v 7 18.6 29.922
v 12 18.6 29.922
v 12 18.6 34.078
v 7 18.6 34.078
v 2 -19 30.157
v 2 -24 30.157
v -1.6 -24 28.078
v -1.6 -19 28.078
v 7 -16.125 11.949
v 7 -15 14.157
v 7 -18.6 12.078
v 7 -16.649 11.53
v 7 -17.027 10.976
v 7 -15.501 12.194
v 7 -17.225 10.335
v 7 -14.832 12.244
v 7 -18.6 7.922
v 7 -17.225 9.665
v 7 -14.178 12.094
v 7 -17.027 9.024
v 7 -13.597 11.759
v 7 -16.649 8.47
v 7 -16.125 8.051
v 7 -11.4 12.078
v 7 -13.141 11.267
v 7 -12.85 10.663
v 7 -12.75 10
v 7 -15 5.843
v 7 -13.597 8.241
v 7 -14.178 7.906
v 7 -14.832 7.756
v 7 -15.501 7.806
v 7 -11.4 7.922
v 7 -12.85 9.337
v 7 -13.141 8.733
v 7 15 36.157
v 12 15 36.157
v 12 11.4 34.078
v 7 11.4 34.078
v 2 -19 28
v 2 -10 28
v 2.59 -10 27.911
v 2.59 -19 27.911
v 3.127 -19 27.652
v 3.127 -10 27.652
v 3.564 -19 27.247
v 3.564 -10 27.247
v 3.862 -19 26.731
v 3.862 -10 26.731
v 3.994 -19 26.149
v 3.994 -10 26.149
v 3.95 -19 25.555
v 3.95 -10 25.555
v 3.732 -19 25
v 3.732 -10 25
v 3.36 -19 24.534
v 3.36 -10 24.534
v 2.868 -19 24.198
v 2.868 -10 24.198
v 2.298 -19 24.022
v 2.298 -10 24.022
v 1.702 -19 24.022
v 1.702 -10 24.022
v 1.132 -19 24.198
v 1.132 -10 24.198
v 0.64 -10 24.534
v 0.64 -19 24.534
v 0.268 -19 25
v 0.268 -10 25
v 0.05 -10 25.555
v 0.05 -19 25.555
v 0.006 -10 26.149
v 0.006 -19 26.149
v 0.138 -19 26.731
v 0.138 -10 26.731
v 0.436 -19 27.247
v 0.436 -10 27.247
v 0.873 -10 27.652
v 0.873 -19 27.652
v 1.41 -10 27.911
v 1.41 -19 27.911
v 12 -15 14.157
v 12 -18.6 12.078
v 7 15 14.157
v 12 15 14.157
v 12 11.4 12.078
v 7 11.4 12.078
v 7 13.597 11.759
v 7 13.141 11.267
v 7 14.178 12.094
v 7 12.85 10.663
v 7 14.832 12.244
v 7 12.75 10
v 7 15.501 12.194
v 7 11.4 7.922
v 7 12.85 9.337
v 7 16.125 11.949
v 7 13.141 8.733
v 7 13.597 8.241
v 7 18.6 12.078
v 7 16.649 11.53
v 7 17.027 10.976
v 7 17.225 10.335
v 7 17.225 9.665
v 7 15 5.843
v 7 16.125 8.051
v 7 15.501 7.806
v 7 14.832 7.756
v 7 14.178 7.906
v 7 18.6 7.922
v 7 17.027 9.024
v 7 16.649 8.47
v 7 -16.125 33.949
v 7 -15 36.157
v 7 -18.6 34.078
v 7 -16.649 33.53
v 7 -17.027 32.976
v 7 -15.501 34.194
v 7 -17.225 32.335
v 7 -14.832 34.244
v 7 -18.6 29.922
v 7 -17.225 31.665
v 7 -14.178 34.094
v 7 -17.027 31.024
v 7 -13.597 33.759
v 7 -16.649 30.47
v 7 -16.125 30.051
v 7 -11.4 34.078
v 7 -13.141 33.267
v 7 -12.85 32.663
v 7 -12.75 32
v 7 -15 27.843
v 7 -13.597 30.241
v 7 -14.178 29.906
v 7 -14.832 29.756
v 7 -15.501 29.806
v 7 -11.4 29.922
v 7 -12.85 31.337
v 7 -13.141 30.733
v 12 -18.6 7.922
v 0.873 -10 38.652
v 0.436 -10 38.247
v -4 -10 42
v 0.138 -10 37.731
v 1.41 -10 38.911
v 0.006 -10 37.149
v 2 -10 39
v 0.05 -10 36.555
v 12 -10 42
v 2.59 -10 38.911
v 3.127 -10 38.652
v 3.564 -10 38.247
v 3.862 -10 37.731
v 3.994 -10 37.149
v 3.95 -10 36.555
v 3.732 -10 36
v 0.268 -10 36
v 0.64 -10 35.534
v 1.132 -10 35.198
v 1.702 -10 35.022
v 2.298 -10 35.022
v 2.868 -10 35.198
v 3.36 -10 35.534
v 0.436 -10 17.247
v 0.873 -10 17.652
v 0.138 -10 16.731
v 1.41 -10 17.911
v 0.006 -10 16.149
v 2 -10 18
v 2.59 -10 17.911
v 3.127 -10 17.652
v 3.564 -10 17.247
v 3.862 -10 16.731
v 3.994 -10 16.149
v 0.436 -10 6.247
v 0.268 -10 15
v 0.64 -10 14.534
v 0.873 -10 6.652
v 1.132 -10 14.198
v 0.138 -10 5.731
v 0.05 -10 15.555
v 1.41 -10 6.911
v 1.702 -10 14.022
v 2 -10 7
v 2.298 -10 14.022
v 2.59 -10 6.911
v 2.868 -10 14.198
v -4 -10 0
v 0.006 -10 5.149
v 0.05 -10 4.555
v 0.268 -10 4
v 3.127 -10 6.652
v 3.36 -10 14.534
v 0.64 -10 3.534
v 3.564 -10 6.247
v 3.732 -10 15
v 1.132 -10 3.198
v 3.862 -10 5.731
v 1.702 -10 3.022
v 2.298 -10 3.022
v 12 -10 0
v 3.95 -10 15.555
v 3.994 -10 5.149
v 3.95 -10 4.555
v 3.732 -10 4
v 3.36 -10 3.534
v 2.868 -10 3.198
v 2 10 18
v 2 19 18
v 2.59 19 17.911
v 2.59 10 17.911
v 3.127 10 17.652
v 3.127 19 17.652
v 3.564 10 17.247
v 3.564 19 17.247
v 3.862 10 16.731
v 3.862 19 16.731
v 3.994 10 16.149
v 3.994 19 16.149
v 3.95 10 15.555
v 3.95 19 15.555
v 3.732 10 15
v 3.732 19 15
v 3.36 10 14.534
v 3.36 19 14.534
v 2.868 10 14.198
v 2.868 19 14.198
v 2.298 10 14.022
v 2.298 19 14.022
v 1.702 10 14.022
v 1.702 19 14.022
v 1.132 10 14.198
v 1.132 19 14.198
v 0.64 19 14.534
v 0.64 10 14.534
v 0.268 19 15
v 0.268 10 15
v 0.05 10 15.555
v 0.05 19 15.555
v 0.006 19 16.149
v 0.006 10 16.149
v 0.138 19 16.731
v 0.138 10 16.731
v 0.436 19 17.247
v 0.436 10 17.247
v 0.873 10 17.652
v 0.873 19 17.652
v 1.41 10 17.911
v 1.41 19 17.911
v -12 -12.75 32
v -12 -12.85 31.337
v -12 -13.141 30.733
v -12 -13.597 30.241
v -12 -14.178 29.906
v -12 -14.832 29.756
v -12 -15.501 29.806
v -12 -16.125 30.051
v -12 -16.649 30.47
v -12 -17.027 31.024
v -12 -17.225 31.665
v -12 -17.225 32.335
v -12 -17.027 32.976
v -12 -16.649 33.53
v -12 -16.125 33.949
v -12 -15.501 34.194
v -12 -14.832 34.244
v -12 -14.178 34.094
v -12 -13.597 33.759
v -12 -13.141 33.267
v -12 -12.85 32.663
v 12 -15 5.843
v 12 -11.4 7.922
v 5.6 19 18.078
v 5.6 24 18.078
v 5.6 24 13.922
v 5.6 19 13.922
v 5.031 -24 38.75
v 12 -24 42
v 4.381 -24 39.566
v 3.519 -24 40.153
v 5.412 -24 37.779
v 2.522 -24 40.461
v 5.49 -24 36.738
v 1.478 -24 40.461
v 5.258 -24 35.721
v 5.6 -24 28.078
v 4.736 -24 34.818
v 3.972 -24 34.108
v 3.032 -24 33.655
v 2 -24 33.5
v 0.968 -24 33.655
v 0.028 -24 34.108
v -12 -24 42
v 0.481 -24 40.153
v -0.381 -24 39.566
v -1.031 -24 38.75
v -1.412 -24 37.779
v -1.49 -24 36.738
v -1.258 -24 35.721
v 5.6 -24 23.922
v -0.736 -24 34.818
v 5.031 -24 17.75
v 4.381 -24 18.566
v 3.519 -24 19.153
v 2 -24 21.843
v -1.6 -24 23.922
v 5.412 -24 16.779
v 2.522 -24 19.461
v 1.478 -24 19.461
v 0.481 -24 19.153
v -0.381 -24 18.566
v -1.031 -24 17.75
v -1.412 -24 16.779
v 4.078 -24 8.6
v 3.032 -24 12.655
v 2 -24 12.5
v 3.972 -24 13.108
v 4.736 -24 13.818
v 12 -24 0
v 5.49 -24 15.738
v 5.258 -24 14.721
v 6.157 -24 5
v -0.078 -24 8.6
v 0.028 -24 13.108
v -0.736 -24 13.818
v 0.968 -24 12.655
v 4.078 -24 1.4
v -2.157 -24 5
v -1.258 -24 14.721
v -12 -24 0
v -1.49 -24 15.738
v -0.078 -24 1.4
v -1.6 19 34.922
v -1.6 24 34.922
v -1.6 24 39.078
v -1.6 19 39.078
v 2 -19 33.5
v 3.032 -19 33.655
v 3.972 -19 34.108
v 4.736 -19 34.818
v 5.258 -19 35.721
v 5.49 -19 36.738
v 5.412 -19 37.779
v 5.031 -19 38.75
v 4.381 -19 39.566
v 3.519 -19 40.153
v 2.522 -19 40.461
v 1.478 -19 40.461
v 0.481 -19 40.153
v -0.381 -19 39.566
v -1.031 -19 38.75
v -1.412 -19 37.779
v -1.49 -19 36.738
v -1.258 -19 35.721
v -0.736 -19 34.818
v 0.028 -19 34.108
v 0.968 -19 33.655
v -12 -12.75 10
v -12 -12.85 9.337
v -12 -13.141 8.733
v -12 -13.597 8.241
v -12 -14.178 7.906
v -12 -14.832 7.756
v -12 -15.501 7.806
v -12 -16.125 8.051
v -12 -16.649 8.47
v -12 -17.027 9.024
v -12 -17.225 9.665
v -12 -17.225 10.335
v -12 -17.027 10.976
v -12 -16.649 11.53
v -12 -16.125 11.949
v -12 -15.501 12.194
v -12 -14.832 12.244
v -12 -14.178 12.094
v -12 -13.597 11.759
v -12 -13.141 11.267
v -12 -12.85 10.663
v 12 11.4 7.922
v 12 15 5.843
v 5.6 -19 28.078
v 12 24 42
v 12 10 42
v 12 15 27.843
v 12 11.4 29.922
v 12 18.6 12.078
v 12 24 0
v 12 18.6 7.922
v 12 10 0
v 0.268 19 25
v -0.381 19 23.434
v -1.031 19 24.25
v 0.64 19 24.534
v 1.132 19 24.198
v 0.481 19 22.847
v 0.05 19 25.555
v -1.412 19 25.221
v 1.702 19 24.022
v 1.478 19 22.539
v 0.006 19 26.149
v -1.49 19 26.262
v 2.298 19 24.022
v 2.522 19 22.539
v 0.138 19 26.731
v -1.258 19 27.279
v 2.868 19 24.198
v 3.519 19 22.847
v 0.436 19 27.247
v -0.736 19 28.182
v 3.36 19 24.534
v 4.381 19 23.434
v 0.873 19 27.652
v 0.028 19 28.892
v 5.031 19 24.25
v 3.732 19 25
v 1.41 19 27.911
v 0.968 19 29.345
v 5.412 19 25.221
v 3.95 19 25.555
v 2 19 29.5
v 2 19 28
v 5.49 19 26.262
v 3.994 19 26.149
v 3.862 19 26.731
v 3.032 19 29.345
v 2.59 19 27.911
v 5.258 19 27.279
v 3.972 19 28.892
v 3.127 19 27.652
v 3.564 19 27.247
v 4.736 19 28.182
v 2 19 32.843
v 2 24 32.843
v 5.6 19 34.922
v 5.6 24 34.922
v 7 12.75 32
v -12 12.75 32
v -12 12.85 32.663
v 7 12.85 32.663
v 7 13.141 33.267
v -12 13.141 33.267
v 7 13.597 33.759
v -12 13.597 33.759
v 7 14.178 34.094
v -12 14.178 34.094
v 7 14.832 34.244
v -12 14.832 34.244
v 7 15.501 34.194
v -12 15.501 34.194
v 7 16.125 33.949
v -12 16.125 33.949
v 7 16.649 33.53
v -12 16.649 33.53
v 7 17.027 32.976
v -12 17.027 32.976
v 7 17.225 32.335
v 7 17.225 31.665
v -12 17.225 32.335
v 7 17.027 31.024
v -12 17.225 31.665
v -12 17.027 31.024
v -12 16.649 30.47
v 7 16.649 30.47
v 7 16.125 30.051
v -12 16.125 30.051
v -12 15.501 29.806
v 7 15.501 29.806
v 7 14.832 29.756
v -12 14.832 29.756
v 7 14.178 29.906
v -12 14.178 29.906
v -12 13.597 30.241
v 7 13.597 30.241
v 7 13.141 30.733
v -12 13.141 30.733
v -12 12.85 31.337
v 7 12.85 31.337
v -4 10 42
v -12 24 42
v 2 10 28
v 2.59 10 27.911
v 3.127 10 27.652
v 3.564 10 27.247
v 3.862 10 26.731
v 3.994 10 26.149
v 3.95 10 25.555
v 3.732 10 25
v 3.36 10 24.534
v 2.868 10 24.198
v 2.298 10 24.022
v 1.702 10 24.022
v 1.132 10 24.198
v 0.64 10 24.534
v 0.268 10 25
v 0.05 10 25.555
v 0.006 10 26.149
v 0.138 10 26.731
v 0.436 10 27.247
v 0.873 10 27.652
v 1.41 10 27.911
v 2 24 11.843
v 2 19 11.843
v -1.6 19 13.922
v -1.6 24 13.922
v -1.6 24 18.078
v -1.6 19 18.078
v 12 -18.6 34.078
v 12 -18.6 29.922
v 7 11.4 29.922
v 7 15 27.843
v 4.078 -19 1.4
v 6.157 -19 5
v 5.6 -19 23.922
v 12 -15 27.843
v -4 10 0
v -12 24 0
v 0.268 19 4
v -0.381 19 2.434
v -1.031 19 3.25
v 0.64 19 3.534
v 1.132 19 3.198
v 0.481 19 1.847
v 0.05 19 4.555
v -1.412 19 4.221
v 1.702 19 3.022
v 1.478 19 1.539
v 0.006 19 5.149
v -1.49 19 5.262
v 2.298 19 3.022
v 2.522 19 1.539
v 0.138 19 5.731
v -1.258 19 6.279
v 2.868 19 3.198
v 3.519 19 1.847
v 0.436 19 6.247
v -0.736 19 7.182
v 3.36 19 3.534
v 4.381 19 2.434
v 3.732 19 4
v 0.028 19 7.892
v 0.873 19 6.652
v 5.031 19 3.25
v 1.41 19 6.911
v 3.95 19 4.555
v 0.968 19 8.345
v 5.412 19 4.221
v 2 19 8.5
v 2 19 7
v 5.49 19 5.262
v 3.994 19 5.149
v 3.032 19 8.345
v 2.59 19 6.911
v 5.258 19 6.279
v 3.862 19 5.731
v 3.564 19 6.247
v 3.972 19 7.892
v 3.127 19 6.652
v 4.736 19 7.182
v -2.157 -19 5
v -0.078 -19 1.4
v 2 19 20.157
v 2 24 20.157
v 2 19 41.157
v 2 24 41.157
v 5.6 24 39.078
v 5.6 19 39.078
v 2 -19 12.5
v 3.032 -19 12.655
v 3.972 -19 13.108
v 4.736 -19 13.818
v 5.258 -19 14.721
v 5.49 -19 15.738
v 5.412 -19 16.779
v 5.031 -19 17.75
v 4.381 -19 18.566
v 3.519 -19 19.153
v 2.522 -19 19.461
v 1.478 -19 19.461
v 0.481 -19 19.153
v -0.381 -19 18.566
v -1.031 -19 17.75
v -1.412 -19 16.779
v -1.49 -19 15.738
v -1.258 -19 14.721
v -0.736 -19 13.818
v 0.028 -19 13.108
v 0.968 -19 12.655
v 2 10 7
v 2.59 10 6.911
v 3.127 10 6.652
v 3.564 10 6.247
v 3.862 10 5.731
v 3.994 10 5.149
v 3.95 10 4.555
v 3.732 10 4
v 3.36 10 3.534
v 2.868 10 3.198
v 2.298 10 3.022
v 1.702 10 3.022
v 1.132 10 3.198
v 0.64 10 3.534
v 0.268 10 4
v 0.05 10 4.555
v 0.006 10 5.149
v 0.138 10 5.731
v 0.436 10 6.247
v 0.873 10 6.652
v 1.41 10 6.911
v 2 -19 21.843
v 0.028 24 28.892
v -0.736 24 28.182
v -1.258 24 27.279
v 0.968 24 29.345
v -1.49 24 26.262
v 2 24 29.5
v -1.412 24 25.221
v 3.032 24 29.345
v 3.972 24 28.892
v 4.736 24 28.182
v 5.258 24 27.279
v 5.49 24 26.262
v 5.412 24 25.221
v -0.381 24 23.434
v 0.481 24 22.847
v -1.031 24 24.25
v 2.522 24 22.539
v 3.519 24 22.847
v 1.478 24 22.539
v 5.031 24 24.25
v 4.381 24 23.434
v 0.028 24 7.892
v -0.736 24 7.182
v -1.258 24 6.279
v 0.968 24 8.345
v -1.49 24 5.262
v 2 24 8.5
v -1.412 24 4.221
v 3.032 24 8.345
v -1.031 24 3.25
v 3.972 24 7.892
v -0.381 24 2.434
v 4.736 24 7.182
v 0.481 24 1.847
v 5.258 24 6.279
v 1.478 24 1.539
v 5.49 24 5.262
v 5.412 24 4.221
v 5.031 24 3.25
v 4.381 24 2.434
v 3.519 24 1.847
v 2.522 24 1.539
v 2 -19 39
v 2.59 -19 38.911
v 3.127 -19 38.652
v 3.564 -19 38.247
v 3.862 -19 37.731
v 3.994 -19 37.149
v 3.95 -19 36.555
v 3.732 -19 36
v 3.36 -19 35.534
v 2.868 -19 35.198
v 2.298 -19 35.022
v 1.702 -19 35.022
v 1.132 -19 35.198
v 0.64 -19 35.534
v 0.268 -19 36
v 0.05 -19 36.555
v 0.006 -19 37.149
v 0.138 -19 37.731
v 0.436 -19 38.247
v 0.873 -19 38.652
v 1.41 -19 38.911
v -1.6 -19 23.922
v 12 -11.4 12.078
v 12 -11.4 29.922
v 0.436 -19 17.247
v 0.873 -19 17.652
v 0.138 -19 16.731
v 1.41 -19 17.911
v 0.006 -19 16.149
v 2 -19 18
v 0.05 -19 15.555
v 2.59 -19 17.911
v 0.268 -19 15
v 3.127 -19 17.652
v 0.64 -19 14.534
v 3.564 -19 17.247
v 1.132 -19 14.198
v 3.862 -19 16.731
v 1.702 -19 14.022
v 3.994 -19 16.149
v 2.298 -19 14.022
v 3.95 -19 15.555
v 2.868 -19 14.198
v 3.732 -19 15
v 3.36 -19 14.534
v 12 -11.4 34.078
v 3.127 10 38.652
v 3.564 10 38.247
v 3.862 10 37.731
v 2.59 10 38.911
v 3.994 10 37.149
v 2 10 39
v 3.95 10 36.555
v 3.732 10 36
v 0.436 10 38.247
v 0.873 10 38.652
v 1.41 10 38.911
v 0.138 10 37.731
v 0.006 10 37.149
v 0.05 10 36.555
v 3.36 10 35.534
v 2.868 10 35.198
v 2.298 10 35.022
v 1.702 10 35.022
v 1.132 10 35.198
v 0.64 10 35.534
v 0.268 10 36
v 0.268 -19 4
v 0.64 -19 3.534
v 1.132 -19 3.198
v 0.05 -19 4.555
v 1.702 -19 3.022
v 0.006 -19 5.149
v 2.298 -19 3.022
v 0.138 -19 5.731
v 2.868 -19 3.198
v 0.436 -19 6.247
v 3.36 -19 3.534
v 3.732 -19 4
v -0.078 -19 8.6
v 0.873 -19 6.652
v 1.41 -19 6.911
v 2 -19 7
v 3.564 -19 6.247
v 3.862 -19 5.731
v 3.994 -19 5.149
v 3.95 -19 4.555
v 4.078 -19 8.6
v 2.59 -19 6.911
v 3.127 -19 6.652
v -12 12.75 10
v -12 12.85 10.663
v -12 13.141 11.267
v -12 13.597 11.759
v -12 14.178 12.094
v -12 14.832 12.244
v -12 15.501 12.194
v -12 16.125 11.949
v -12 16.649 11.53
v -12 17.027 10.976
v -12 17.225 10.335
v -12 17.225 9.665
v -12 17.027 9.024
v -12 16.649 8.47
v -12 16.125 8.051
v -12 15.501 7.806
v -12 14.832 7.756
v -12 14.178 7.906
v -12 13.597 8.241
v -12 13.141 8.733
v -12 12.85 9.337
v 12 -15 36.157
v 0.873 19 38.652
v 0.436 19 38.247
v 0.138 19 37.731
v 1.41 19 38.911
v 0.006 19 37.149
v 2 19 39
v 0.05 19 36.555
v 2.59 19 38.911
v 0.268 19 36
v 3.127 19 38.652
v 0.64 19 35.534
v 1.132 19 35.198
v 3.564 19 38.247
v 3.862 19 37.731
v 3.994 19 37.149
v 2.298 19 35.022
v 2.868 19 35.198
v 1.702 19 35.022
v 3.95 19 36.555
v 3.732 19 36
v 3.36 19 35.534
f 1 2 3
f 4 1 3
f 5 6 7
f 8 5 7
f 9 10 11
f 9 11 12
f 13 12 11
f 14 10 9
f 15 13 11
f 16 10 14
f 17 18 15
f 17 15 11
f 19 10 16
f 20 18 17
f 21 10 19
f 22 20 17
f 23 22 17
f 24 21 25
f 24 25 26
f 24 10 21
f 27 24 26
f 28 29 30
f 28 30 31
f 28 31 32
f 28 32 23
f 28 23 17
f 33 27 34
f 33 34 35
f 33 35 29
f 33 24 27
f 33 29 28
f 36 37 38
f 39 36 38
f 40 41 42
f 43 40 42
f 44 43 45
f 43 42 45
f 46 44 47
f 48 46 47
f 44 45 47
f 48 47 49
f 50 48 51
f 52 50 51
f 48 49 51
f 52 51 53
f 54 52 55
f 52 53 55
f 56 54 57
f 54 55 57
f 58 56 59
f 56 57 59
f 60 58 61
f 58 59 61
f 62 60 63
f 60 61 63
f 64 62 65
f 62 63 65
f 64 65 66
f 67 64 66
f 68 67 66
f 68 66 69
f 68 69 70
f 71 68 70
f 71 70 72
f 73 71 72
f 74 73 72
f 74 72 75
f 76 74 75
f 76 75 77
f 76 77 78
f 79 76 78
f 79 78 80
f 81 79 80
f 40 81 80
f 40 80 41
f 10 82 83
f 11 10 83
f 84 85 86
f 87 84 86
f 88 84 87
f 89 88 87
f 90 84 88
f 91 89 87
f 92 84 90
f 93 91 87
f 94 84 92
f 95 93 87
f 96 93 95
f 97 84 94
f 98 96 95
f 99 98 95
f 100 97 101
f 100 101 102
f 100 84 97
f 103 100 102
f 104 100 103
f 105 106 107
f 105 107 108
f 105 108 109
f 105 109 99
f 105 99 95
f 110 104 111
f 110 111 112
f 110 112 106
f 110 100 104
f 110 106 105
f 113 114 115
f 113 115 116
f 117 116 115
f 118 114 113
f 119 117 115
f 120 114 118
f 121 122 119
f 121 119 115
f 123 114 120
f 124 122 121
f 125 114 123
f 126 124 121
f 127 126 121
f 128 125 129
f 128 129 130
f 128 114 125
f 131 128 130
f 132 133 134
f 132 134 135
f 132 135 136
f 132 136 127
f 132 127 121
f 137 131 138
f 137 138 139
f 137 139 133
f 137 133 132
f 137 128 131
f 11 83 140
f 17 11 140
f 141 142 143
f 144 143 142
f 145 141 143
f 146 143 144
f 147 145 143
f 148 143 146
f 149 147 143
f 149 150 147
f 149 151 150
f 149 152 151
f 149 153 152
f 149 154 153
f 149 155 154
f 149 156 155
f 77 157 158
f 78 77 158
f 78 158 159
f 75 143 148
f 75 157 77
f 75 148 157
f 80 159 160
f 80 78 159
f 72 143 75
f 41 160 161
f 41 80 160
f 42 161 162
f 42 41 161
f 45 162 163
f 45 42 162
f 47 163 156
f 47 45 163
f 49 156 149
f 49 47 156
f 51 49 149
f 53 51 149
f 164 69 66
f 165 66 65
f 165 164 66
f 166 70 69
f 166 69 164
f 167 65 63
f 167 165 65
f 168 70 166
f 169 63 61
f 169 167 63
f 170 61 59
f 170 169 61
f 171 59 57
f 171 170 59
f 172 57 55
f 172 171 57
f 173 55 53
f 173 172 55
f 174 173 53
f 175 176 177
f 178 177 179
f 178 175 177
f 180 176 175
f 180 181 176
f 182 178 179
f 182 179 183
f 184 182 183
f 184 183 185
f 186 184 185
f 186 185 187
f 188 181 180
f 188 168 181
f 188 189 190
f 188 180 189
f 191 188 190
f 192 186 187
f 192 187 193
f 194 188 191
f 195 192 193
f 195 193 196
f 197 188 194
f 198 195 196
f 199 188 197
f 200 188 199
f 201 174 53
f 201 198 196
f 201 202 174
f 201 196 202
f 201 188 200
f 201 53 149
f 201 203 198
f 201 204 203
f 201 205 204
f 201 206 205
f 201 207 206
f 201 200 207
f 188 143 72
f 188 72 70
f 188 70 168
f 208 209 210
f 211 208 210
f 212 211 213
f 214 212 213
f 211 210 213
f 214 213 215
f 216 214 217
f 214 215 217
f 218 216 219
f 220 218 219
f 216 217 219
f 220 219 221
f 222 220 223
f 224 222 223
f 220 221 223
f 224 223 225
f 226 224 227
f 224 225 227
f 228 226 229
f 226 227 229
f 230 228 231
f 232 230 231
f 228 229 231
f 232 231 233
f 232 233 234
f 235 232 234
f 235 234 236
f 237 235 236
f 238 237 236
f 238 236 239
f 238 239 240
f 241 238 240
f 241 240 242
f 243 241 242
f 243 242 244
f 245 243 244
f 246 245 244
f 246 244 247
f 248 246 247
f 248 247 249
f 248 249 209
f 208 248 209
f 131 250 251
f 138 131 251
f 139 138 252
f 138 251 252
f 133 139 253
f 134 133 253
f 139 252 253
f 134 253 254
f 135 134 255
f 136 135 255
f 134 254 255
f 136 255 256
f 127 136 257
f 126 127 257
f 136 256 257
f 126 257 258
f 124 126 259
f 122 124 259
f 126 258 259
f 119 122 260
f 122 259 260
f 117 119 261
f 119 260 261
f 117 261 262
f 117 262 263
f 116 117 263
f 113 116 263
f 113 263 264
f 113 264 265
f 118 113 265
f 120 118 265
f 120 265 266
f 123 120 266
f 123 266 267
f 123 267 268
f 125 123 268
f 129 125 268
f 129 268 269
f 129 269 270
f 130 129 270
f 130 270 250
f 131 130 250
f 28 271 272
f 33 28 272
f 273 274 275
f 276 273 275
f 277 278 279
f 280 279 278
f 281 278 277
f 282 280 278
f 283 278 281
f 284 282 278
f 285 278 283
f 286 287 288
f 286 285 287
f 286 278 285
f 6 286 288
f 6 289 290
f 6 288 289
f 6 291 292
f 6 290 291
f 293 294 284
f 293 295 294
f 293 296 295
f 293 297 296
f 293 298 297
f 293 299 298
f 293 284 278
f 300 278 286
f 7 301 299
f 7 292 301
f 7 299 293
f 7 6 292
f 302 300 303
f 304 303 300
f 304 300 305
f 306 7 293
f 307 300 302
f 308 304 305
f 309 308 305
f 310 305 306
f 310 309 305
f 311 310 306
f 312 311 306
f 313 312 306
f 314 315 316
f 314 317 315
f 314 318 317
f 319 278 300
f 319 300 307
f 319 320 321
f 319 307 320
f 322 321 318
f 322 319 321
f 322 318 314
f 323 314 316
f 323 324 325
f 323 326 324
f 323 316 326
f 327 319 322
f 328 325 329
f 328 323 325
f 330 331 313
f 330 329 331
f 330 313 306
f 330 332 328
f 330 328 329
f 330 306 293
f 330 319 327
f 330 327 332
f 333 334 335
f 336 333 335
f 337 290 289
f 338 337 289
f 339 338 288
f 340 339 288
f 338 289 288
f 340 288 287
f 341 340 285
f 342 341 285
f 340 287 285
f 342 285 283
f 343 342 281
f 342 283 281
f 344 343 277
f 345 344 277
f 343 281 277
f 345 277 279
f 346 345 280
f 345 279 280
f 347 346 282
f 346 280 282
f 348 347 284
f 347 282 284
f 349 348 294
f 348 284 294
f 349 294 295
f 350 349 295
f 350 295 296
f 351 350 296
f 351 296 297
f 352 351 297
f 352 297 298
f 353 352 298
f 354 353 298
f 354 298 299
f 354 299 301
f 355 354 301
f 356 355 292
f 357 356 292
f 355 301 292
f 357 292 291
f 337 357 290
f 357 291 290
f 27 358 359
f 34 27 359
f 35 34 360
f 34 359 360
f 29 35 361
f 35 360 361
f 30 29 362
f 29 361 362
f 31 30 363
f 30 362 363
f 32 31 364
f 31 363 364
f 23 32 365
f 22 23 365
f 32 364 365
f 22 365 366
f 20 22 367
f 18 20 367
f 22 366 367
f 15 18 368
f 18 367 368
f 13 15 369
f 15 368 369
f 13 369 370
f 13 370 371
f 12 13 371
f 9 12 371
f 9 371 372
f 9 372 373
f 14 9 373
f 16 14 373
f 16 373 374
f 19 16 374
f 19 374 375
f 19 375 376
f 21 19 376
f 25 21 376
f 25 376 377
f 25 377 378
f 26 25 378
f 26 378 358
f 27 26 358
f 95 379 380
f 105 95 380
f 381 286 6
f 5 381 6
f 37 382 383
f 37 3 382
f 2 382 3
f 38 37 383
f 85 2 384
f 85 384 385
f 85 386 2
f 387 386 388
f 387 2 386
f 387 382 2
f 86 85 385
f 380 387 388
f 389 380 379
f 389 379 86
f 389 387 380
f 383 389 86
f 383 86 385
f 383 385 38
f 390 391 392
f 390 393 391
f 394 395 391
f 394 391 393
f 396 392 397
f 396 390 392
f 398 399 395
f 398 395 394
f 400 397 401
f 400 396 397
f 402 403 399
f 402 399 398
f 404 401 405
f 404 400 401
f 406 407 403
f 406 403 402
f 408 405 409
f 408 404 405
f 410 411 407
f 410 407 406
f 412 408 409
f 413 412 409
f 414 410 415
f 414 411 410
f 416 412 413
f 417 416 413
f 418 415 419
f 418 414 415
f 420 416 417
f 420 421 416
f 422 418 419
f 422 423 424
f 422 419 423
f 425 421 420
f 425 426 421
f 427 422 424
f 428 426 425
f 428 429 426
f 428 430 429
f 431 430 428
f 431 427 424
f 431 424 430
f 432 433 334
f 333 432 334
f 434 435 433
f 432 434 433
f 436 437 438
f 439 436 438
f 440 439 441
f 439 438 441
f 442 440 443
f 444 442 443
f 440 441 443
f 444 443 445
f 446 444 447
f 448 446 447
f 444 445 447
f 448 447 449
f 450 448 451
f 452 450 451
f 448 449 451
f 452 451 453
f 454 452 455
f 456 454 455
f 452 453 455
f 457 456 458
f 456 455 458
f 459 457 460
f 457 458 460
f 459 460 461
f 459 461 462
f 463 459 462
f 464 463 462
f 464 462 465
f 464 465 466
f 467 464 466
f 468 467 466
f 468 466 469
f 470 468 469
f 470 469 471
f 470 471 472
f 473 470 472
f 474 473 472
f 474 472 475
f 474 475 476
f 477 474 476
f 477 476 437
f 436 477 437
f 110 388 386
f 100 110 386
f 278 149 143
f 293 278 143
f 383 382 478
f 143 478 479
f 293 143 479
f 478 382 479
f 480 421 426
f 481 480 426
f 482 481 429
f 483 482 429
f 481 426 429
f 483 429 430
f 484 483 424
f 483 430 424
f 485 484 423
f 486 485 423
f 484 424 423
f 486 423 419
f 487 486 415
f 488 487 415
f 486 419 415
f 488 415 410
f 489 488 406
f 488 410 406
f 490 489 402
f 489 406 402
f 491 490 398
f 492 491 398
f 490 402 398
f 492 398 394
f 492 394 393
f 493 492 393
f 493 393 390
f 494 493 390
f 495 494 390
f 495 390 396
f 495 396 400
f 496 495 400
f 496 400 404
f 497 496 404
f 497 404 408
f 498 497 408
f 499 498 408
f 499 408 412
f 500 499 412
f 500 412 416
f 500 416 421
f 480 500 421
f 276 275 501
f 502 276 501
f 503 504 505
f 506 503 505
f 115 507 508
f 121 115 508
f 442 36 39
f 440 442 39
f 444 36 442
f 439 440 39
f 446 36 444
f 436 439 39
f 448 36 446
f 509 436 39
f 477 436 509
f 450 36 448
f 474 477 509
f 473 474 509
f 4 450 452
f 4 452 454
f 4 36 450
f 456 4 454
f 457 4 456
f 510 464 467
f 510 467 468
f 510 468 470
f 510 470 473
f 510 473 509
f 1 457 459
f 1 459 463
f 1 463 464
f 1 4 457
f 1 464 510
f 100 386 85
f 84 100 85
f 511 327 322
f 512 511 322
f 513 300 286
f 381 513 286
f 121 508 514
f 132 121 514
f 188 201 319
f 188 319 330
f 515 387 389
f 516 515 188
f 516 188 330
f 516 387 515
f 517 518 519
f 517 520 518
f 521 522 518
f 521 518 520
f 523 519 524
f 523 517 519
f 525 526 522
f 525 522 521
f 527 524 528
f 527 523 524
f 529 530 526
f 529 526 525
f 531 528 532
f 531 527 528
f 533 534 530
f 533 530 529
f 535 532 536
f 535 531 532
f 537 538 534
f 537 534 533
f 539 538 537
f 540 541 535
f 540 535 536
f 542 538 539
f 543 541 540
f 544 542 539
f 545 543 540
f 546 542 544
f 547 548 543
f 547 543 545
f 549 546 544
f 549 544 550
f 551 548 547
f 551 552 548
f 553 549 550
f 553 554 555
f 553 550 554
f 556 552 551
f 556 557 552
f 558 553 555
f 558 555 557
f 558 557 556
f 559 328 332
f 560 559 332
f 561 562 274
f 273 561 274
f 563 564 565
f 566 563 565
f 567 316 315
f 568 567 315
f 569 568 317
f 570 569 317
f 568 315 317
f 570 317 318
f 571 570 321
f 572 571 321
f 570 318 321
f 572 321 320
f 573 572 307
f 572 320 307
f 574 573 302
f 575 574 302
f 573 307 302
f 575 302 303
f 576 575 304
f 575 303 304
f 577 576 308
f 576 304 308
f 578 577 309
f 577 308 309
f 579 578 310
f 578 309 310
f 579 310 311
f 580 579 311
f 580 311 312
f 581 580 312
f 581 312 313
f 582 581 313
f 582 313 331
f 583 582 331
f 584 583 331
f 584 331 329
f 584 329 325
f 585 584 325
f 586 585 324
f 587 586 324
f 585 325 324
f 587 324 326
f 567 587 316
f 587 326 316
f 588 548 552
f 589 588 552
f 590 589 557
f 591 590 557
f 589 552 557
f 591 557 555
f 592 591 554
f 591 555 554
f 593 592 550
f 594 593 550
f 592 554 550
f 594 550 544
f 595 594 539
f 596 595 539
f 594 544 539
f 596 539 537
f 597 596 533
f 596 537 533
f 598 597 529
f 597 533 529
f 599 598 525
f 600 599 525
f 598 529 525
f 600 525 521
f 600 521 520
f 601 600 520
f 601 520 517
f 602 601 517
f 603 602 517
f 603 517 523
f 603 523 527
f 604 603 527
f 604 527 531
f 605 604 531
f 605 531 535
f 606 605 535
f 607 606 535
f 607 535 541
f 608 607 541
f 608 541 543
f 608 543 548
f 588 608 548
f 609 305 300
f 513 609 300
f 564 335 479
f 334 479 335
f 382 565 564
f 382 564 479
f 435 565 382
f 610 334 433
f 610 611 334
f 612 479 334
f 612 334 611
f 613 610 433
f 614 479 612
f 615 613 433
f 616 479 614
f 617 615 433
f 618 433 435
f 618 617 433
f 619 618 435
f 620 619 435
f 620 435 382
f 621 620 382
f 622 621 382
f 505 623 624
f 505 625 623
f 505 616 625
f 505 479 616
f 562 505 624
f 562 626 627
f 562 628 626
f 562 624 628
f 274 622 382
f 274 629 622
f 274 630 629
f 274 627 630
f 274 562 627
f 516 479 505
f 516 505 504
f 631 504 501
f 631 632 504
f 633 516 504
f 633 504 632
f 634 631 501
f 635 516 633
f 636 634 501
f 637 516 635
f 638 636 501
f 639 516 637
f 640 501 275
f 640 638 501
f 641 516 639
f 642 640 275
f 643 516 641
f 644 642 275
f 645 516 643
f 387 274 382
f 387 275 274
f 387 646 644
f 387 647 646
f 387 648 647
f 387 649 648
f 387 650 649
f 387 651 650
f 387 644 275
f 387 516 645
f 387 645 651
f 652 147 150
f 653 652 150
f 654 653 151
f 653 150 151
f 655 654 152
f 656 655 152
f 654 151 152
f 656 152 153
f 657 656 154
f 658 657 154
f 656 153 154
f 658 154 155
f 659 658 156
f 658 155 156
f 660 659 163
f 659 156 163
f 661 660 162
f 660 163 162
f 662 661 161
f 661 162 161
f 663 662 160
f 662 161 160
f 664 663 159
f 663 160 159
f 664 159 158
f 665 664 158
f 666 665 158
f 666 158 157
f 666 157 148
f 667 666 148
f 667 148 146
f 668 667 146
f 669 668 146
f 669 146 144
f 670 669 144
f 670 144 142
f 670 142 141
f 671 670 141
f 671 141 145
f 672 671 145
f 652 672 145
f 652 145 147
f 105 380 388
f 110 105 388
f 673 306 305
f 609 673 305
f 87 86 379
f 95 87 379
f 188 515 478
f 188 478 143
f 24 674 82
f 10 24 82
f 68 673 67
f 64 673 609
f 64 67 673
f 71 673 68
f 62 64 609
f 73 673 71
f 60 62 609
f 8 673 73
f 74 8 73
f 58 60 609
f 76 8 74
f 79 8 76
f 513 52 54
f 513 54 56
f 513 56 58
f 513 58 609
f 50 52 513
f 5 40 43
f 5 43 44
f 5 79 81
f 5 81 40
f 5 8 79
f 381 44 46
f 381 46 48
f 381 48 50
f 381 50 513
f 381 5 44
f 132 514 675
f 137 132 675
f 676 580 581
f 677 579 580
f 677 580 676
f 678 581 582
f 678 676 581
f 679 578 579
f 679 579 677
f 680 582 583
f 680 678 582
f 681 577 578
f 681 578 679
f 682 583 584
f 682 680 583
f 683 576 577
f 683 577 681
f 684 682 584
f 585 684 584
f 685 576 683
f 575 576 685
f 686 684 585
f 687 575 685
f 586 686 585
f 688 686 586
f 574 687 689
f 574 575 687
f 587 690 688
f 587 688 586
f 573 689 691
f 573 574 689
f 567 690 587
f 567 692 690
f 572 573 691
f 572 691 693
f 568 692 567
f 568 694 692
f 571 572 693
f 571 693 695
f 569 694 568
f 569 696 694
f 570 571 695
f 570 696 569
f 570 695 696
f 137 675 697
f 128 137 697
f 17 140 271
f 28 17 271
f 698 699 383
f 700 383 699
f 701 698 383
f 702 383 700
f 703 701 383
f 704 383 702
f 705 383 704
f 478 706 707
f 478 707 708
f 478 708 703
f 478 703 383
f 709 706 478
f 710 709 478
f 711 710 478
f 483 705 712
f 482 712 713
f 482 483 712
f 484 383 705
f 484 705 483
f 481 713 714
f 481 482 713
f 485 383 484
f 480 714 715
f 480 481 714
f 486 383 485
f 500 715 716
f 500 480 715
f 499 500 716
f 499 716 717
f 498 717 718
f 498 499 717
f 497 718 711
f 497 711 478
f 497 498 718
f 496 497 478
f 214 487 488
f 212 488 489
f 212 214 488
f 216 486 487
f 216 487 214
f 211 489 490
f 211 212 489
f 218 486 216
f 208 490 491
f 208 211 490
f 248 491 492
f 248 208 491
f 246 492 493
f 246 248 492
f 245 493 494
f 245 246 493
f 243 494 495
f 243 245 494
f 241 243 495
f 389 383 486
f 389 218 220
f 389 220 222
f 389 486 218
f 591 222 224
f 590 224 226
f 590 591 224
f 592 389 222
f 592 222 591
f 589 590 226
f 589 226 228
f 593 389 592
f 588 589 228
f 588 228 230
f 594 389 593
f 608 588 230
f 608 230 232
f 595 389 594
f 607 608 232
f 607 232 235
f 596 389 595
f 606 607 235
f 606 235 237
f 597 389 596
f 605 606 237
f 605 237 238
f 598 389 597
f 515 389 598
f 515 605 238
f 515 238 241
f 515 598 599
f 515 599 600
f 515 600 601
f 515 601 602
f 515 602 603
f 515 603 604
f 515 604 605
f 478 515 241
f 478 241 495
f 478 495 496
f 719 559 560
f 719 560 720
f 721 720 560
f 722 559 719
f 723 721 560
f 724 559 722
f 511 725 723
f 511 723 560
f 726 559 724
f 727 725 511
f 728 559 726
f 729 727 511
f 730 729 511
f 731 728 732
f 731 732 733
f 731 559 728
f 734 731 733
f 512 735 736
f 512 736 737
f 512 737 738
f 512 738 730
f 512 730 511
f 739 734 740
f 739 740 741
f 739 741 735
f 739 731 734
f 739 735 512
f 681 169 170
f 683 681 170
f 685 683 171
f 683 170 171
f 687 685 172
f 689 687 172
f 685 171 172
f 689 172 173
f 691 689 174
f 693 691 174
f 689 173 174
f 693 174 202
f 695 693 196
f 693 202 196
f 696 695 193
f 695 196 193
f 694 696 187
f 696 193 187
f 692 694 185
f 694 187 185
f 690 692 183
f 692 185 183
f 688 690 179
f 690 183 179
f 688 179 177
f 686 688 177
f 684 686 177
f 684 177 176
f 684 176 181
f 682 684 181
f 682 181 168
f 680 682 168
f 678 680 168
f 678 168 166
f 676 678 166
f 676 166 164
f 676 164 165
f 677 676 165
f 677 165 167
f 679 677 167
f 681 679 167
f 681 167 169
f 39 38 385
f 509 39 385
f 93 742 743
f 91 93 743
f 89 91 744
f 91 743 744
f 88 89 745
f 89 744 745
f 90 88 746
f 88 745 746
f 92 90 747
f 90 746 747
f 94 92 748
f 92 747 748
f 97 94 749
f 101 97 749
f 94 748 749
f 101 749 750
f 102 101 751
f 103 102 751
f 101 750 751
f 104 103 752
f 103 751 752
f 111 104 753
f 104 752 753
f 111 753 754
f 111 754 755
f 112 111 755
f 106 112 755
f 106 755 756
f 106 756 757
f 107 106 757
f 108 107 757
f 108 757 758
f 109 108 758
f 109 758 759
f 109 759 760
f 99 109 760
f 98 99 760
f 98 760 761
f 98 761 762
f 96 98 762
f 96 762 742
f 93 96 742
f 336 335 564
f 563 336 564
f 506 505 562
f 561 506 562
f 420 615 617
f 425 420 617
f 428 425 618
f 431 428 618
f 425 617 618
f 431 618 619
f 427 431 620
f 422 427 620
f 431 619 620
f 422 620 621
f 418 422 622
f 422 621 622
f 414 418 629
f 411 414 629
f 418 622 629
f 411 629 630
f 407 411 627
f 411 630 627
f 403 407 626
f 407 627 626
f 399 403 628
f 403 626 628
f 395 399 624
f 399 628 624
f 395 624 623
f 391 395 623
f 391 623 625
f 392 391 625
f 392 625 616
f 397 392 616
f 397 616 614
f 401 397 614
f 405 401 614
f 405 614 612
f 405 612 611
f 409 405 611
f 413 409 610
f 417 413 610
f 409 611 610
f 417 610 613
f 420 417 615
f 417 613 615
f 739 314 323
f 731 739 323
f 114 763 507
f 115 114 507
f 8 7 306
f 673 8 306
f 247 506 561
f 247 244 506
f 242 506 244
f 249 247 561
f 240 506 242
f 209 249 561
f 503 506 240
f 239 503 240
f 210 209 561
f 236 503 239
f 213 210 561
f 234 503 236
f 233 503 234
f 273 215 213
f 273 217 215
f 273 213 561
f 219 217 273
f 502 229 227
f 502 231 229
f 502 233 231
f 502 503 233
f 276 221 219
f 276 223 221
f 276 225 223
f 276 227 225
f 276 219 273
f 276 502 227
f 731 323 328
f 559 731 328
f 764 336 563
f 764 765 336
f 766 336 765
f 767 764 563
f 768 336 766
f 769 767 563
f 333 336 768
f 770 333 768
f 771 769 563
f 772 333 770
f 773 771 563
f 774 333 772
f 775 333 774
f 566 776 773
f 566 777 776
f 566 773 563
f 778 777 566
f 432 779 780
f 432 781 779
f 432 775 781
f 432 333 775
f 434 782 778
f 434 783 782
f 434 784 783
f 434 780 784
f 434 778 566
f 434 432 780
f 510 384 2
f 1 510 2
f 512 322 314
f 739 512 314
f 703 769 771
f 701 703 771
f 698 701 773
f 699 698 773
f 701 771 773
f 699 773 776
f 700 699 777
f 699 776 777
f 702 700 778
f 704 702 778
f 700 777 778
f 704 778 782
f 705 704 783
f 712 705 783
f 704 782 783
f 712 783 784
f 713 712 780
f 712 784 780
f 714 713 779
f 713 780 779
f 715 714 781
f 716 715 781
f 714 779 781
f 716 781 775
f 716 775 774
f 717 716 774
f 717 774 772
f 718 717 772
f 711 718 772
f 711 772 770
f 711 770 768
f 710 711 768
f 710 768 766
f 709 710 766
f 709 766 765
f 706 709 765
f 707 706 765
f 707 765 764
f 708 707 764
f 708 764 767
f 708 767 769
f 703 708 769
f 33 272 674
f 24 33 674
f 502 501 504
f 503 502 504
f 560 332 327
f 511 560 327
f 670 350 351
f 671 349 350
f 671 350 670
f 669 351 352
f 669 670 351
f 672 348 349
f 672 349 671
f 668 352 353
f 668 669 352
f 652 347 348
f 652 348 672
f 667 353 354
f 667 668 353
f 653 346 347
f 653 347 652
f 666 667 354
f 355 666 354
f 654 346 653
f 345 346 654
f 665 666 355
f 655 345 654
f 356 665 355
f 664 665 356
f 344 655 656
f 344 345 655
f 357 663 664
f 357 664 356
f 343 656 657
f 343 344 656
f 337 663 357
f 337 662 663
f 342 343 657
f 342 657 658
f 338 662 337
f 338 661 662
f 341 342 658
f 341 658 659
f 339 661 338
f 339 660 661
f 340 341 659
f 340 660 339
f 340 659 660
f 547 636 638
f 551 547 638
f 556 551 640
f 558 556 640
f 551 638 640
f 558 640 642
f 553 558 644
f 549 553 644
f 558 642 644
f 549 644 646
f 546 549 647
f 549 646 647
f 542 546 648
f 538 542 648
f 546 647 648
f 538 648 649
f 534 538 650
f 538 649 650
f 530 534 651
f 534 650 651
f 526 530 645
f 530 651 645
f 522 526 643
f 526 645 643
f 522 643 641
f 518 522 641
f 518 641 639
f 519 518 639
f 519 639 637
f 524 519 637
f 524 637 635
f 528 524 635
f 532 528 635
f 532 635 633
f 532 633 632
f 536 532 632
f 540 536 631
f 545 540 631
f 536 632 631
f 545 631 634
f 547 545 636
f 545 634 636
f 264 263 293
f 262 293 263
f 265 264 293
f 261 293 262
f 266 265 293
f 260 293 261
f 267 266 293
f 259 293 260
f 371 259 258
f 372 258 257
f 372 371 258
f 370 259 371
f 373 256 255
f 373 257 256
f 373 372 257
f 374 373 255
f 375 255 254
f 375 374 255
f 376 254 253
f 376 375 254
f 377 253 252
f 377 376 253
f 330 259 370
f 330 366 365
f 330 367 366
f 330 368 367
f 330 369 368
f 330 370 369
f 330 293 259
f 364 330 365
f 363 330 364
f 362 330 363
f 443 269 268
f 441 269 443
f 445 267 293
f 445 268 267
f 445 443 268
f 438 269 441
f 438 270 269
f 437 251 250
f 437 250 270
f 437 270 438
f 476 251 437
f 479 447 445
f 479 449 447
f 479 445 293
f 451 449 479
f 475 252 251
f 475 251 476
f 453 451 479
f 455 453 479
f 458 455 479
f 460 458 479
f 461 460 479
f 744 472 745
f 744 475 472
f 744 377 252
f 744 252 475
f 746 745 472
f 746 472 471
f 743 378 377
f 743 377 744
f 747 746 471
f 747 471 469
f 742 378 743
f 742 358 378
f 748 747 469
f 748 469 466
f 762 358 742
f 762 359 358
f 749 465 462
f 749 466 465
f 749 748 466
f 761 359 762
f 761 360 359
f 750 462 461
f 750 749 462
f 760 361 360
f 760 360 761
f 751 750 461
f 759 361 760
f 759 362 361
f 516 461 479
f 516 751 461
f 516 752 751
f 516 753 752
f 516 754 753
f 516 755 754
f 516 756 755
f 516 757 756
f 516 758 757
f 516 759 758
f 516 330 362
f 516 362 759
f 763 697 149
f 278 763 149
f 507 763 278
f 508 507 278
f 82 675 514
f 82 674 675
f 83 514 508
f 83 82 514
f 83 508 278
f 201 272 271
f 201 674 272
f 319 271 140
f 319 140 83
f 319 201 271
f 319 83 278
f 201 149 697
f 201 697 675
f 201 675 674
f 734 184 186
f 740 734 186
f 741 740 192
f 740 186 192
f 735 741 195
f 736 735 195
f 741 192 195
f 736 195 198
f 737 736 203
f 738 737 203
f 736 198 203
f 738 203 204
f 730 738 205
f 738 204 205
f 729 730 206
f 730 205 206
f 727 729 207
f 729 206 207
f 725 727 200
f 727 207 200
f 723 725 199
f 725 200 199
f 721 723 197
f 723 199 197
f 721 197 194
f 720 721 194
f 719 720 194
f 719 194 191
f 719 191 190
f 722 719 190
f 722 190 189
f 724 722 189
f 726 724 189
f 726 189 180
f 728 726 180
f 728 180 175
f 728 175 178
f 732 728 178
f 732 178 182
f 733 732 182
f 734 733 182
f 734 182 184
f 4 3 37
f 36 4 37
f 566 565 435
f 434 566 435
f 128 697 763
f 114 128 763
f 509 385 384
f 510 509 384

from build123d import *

# Parameters (mm, degrees)
EXTRUDE_1_DEPTH     = 42
SKETCH_2_R          = 2
CUT_EXTRUDE_1_DEPTH = 65.899922958
SKETCH_3_R          = 2.25
CUT_EXTRUDE_2_DEPTH = 55
CUT_EXTRUDE_3_DEPTH = 5
SKETCH_5_R          = 3.5
CUT_EXTRUDE_4_DEPTH = 5
SKETCH_6_R          = 3.5
CUT_EXTRUDE_5_DEPTH = 5


with BuildPart() as part:
    # 草圖1 → 填料-伸長1 (new body)
    with BuildSketch(Plane.XY):
        Polygon((12, 10), (-4, 10), (-4, -10), (12, -10), (12, -24), (-12, -24), (-12, 24), (12, 24), align=None)
    extrude(amount=EXTRUDE_1_DEPTH)

    # 草圖2 → 除料-伸長1 (cut, through all)
    with BuildSketch(Plane(origin=(0, 24, 0), x_dir=(1, 0, 0), z_dir=(0, 1, 0))):
        with Locations((2, -5)):
            Circle(SKETCH_2_R)
        with Locations((2, -16)):
            Circle(SKETCH_2_R)
        with Locations((2, -26)):
            Circle(SKETCH_2_R)
        with Locations((2, -37)):
            Circle(SKETCH_2_R)
    extrude(amount=-CUT_EXTRUDE_1_DEPTH, mode=Mode.SUBTRACT)

    # 草圖3 → 除料-伸長2 (cut, through all)
    with BuildSketch(Plane.ZY.offset(12)):
        with Locations((10, 15)):
            Circle(SKETCH_3_R)
        with Locations((32, 15)):
            Circle(SKETCH_3_R)
        with Locations((32, -15)):
            Circle(SKETCH_3_R)
        with Locations((10, -15)):
            Circle(SKETCH_3_R)
    extrude(amount=-CUT_EXTRUDE_2_DEPTH, mode=Mode.SUBTRACT)

    # 草圖4 → 除料-伸長3 (cut)
    with BuildSketch(Plane(origin=(12, 0, 0), x_dir=(0, 0, -1), z_dir=(1, 0, 0))):
        Polygon((-5.843078062, 15), (-7.921539031, 18.6), (-12.078460969, 18.6), (-14.156921938, 15), (-12.078460969, 11.4), (-7.921539031, 11.4), align=None)
        Polygon((-27.843078062, 15), (-29.921539031, 18.6), (-34.078460969, 18.6), (-36.156921938, 15), (-34.078460969, 11.4), (-29.921539031, 11.4), align=None)
        Polygon((-27.843078062, -15), (-29.921539031, -11.4), (-34.078460969, -11.4), (-36.156921938, -15), (-34.078460969, -18.6), (-29.921539031, -18.6), align=None)
        Polygon((-5.843078062, -15), (-7.921539031, -11.4), (-12.078460969, -11.4), (-14.156921938, -15), (-12.078460969, -18.6), (-7.921539031, -18.6), align=None)
    extrude(amount=-CUT_EXTRUDE_3_DEPTH, mode=Mode.SUBTRACT)

    # 草圖5 → 除料-伸長4 (cut)
    with BuildSketch(Plane.XZ.offset(24)):
        with Locations((2, 16)):
            Circle(SKETCH_5_R)
        with Locations((2, 37)):
            Circle(SKETCH_5_R)
        Polygon((2, 21.843078062), (5.6, 23.921539031), (5.6, 28.078460969), (2, 30.156921938), (-1.6, 28.078460969), (-1.6, 23.921539031), align=None)
        Polygon((6.156921938, 5), (4.078460969, 8.6), (-0.078460969, 8.6), (-2.156921938, 5), (-0.078460969, 1.4), (4.078460969, 1.4), align=None)
    extrude(amount=-CUT_EXTRUDE_4_DEPTH, mode=Mode.SUBTRACT)

    # 草圖6 → 除料-伸長5 (cut)
    with BuildSketch(Plane(origin=(0, 24, 0), x_dir=(1, 0, 0), z_dir=(0, 1, 0))):
        with Locations((2, -26)):
            Circle(SKETCH_6_R)
        with Locations((2, -5)):
            Circle(SKETCH_6_R)
        Polygon((2, -11.843078062), (-1.6, -13.921539031), (-1.6, -18.078460969), (2, -20.156921938), (5.6, -18.078460969), (5.6, -13.921539031), align=None)
        Polygon((2, -32.843078062), (-1.6, -34.921539031), (-1.6, -39.078460969), (2, -41.156921938), (5.6, -39.078460969), (5.6, -34.921539031), align=None)
    extrude(amount=-CUT_EXTRUDE_5_DEPTH, mode=Mode.SUBTRACT)


solid = part.part
